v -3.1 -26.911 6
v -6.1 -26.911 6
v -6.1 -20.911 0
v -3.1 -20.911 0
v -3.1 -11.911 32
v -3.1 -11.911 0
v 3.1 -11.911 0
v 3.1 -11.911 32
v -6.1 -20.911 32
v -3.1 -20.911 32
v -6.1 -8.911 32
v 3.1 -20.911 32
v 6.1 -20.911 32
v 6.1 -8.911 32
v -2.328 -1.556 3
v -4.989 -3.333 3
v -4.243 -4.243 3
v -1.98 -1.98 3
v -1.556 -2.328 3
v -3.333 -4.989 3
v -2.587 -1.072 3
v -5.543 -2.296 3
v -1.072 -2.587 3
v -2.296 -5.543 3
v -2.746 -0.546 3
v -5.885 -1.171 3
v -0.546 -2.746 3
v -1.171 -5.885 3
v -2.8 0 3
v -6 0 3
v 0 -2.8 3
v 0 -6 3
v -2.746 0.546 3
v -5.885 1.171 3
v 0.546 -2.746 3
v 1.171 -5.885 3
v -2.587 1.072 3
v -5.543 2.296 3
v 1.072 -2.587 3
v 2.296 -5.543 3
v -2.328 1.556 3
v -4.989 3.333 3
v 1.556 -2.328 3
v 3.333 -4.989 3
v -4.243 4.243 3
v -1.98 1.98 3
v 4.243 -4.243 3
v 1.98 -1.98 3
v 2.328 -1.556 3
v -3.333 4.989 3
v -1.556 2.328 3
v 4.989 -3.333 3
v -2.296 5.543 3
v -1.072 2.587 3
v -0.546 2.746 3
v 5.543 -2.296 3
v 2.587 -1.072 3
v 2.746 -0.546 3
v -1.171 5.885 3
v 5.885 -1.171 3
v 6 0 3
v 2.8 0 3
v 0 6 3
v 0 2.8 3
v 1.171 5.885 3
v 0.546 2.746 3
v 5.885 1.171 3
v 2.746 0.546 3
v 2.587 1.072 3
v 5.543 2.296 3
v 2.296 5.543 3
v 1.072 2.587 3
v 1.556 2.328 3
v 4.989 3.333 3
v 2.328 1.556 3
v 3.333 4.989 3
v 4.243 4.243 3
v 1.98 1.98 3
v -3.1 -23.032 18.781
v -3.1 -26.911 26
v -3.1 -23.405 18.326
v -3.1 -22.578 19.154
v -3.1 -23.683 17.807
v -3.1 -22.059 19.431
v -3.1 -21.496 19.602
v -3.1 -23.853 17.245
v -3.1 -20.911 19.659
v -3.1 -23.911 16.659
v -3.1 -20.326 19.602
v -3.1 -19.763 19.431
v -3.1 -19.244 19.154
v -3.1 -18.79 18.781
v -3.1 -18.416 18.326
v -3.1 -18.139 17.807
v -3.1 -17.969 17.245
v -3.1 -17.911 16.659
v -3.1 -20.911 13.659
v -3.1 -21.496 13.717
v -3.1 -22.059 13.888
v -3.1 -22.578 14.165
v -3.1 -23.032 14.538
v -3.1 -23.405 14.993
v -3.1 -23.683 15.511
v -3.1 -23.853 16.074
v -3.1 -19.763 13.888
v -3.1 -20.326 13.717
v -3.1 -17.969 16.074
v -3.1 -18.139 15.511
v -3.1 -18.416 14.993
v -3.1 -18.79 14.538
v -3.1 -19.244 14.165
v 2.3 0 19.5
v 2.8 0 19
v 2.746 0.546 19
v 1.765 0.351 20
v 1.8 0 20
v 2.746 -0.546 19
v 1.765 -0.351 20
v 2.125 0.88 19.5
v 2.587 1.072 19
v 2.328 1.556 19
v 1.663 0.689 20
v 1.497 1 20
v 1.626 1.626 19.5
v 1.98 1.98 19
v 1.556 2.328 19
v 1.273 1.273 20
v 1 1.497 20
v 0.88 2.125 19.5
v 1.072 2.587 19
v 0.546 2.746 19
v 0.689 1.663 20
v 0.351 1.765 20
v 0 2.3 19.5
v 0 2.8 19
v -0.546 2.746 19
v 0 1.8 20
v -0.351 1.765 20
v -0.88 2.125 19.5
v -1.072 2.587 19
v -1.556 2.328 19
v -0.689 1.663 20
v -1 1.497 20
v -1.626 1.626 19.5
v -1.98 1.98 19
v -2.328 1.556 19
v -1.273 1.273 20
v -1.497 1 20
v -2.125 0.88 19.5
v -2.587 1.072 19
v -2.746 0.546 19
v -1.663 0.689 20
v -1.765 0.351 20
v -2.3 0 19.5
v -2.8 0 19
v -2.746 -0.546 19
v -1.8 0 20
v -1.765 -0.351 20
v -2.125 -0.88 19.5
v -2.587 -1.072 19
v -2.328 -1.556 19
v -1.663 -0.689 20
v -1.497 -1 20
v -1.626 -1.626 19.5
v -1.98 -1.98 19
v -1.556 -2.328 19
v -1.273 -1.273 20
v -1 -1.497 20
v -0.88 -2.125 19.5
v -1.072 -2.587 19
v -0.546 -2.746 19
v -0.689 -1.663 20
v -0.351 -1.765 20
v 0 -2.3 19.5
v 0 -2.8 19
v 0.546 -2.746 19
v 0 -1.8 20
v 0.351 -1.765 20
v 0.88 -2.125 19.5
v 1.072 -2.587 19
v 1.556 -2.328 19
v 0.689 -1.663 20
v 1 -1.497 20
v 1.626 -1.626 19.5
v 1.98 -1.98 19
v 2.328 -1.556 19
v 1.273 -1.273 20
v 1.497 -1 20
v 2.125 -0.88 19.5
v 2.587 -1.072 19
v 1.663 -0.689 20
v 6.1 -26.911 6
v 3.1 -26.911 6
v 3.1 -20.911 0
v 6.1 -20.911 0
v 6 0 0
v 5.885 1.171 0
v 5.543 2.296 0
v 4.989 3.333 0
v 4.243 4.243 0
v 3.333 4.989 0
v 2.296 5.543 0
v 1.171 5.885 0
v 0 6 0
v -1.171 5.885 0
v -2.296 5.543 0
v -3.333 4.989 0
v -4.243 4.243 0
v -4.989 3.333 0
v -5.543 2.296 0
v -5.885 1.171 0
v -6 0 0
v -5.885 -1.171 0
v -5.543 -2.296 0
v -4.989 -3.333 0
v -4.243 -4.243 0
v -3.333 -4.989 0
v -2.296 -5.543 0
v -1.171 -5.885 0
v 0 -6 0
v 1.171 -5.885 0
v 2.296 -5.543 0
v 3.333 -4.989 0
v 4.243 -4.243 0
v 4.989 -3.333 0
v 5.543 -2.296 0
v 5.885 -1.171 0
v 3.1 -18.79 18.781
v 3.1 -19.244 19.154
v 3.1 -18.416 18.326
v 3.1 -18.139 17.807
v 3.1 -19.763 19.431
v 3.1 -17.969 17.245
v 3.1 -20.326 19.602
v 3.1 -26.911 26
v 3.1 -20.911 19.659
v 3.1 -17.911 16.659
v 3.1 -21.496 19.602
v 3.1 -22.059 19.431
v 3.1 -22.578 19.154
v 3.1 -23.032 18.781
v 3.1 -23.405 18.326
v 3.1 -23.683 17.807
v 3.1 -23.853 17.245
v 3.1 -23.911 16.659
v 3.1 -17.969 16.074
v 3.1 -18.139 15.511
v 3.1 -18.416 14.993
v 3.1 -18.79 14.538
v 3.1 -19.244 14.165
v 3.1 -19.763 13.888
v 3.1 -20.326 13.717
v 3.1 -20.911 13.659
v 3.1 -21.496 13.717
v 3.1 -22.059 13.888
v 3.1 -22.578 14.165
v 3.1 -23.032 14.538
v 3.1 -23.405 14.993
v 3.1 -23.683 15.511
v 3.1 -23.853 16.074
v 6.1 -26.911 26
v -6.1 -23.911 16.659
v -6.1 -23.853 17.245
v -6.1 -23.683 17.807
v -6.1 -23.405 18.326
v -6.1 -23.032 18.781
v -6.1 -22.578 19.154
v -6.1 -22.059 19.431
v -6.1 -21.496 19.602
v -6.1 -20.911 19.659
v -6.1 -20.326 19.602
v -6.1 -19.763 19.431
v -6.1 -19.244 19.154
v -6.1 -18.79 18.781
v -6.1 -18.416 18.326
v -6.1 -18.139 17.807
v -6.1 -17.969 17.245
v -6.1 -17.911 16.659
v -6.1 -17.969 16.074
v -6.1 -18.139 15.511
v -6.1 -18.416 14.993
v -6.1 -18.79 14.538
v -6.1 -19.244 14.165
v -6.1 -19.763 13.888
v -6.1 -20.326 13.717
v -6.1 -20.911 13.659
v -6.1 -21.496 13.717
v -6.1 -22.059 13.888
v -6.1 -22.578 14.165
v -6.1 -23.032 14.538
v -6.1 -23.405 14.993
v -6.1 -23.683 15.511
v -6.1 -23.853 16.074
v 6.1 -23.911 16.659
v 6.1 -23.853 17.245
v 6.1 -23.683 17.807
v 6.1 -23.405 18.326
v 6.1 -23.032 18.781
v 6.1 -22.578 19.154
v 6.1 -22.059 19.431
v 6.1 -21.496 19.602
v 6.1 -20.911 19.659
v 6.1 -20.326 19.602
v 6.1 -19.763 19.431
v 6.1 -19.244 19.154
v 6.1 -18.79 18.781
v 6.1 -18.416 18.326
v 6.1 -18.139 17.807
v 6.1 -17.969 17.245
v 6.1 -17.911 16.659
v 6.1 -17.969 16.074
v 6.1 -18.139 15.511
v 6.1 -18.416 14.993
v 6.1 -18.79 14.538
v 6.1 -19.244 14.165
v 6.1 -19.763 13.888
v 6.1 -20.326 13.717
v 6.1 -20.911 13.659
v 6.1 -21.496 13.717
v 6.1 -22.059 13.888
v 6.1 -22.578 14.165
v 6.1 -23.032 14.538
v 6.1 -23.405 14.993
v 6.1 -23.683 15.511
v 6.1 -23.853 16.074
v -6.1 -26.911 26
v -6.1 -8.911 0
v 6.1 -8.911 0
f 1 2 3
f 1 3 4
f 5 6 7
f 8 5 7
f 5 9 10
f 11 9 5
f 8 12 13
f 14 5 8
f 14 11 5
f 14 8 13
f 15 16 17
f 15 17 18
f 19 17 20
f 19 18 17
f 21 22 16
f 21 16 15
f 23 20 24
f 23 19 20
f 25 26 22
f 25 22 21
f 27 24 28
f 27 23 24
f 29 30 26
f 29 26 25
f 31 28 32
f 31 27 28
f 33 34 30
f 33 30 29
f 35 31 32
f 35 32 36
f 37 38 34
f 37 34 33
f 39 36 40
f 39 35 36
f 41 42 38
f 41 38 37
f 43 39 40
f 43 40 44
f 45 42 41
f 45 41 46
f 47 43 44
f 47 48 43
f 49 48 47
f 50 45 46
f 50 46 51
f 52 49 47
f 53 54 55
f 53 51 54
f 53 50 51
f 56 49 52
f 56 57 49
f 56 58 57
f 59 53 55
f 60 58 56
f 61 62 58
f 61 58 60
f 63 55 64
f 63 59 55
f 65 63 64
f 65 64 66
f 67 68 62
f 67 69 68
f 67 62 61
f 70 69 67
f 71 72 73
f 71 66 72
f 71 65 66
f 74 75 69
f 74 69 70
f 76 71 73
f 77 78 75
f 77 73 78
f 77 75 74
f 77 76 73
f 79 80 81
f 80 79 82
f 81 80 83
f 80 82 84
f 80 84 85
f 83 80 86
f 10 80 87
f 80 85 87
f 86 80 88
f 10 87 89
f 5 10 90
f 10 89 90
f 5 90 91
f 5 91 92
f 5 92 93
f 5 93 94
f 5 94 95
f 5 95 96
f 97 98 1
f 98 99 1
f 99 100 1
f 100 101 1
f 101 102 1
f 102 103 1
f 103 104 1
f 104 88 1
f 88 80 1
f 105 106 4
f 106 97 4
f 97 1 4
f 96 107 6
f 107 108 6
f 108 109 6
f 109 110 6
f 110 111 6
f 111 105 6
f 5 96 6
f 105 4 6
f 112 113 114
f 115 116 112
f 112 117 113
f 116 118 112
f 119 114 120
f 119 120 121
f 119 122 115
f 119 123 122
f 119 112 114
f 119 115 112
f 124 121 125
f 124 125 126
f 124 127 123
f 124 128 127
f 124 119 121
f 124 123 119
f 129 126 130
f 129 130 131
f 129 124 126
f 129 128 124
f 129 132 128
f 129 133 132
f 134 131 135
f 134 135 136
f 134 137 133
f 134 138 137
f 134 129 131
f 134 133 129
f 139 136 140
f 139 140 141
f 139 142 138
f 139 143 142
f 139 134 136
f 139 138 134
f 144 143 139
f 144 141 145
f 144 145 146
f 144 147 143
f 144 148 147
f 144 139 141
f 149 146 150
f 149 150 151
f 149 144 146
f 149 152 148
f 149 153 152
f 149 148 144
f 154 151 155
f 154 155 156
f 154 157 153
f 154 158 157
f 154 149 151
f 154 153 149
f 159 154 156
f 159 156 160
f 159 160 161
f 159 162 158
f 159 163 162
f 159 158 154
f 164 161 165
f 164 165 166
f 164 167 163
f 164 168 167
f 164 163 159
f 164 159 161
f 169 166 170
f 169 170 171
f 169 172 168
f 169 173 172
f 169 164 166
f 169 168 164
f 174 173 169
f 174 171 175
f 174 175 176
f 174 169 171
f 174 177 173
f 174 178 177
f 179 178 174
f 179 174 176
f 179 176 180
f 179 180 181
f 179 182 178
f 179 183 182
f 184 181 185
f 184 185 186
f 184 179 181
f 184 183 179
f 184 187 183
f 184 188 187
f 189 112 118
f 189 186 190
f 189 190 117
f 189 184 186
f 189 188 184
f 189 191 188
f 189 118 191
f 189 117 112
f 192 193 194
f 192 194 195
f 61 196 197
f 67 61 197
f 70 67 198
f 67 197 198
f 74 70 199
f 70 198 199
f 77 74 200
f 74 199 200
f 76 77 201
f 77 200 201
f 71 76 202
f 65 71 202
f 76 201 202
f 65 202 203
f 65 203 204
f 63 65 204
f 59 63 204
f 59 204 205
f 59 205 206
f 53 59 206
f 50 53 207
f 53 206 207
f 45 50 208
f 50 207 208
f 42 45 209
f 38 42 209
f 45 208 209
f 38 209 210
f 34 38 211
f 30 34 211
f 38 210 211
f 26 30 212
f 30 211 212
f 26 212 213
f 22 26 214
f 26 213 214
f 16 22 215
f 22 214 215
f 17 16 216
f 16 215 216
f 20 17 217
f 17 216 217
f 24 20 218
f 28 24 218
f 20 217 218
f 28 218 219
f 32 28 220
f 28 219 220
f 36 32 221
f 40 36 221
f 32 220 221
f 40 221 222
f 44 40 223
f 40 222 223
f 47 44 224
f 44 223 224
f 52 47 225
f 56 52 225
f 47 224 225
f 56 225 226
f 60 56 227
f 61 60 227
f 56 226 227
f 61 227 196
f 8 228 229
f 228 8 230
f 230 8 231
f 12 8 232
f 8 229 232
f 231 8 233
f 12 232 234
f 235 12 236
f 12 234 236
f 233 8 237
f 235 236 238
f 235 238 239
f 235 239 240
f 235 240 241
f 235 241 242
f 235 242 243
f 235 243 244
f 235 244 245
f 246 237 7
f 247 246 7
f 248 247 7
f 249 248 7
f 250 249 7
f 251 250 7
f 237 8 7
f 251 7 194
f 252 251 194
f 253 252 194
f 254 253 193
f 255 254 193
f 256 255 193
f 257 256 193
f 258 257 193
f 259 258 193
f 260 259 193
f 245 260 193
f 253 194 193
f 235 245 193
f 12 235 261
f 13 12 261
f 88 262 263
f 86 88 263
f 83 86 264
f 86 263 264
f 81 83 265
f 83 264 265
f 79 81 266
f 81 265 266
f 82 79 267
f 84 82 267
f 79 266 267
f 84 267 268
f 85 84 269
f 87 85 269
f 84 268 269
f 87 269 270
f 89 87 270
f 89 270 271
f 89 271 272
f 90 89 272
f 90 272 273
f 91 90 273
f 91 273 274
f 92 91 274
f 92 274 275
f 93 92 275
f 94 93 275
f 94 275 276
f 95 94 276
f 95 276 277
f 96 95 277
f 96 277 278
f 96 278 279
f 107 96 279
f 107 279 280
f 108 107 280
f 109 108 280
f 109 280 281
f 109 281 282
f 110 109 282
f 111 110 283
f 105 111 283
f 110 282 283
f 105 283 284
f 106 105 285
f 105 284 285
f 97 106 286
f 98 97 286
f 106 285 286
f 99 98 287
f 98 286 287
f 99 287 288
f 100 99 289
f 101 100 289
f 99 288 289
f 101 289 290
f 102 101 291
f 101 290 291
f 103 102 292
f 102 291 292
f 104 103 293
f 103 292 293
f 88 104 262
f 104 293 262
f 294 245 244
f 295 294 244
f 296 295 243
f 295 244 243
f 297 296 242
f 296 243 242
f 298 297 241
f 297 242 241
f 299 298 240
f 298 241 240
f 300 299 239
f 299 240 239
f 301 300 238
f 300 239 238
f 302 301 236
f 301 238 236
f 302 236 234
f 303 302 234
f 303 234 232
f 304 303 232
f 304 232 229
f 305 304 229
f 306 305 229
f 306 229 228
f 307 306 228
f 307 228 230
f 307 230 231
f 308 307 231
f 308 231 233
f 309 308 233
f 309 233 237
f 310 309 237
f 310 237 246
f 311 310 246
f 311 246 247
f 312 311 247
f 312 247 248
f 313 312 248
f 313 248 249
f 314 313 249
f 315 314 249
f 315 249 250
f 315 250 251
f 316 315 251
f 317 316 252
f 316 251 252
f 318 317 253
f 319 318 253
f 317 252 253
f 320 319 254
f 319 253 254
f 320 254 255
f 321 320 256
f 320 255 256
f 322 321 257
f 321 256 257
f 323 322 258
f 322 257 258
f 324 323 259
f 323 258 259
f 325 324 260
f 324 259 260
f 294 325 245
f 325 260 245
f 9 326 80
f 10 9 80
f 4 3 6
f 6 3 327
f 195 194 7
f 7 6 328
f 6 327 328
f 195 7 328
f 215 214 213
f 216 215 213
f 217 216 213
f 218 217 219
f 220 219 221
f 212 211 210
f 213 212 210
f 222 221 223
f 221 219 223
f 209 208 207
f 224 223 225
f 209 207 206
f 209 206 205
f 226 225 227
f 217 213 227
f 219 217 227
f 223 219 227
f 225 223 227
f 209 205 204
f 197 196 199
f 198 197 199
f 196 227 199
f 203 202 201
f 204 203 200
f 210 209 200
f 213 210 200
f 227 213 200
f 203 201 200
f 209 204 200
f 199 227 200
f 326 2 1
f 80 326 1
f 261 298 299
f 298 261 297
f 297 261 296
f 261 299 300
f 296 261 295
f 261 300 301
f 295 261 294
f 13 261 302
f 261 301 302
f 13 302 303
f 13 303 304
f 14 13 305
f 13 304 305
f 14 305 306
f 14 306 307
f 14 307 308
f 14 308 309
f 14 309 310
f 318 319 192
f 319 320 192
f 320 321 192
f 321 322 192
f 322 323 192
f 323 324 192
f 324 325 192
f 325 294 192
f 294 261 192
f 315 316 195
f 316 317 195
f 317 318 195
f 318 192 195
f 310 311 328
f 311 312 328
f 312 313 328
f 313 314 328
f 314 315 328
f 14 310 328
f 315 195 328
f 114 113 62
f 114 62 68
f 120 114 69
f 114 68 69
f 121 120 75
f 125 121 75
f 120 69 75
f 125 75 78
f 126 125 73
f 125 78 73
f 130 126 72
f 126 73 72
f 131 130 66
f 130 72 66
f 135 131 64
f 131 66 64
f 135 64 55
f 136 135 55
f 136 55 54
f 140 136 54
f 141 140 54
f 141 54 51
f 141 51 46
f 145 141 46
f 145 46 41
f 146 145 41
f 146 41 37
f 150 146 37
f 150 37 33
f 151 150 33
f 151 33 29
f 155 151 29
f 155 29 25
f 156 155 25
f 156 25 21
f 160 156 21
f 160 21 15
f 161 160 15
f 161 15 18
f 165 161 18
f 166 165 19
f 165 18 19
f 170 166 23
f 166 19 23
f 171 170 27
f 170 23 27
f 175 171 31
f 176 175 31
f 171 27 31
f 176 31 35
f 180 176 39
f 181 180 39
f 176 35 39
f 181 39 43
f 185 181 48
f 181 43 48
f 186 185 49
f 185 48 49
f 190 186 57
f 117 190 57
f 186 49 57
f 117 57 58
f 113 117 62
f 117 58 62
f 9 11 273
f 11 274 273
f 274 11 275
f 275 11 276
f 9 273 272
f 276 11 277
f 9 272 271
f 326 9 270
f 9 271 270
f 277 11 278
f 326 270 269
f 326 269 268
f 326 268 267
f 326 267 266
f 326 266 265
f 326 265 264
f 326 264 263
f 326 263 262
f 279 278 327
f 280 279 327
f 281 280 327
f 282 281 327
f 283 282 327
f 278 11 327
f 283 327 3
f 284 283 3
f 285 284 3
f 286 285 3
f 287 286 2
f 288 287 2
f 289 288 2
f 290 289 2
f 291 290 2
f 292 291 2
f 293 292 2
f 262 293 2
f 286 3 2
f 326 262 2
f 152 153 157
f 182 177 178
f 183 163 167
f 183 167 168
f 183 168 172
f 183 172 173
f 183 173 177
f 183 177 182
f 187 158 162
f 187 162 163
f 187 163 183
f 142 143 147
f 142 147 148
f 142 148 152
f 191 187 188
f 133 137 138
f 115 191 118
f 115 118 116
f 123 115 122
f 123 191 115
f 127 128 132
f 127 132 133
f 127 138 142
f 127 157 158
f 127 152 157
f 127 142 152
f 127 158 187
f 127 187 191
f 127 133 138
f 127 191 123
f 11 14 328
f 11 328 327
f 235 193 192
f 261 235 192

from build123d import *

# Parameters (mm, degrees)
F0_R     = 6
F0_R_2   = 2.8
F1_DEPTH = 3
F2_DEPTH = 20
F3_SIZE  = 1
F0_W     = 6.2
F0_H     = 3
F4_DEPTH = 32
F5_R     = 3
F6_DEPTH = 25
F7_SIZE  = 6


with BuildPart() as f1:
    # F0 (on Top) → F1 (new body)
    with BuildSketch(Plane.XY):
        Circle(F0_R)
        Circle(F0_R_2, mode=Mode.SUBTRACT)
    extrude(amount=F1_DEPTH)

    # F0 (on Top) → F2 (join)
    with BuildSketch(Plane.XY):
        Circle(F0_R_2)
    extrude(amount=F2_DEPTH)

    # F3
    f3_edges = [f1.edges().sort_by_distance(p)[0] for p in [
        (-2.8, 0, 20),
    ]]
    chamfer(f3_edges, length=F3_SIZE)


with BuildPart() as f4:
    # F0 (on Top) → F4 (new body)
    with BuildSketch(Plane.XY):
        Polygon((3.1, -8.9108899832), (3.1, -11.9108899832), (3.1, -26.9108899832), (6.1, -26.9108899832), (6.1, -8.9108899832), align=None)
        with Locations((0, -10.4108899832)):
            Rectangle(F0_W, F0_H)
        Polygon((-3.1, -26.9108899832), (-3.1, -11.9108899832), (-3.1, -8.9108899832), (-6.1, -8.9108899832), (-6.1, -26.9108899832), align=None)
    extrude(amount=F4_DEPTH)

    # F5 (on face) → F6 (cut)
    with BuildSketch(Plane(origin=(-6.1, 0, 0), x_dir=(0, -1, 0), z_dir=(-1, 0, 0))):
        with Locations((20.9108899832, 16.6593194008)):
            Circle(F5_R)
    extrude(amount=-F6_DEPTH, mode=Mode.SUBTRACT)

    # F7
    f7_edges = [f4.edges().sort_by_distance(p)[0] for p in [
        (-4.6, -26.91089, 32),
        (4.6, -26.91089, 32),
        (-4.6, -26.91089, 0),
        (4.6, -26.91089, 0),
    ]]
    chamfer(f7_edges, length=F7_SIZE)


solid = Compound([f1.part, f4.part])
